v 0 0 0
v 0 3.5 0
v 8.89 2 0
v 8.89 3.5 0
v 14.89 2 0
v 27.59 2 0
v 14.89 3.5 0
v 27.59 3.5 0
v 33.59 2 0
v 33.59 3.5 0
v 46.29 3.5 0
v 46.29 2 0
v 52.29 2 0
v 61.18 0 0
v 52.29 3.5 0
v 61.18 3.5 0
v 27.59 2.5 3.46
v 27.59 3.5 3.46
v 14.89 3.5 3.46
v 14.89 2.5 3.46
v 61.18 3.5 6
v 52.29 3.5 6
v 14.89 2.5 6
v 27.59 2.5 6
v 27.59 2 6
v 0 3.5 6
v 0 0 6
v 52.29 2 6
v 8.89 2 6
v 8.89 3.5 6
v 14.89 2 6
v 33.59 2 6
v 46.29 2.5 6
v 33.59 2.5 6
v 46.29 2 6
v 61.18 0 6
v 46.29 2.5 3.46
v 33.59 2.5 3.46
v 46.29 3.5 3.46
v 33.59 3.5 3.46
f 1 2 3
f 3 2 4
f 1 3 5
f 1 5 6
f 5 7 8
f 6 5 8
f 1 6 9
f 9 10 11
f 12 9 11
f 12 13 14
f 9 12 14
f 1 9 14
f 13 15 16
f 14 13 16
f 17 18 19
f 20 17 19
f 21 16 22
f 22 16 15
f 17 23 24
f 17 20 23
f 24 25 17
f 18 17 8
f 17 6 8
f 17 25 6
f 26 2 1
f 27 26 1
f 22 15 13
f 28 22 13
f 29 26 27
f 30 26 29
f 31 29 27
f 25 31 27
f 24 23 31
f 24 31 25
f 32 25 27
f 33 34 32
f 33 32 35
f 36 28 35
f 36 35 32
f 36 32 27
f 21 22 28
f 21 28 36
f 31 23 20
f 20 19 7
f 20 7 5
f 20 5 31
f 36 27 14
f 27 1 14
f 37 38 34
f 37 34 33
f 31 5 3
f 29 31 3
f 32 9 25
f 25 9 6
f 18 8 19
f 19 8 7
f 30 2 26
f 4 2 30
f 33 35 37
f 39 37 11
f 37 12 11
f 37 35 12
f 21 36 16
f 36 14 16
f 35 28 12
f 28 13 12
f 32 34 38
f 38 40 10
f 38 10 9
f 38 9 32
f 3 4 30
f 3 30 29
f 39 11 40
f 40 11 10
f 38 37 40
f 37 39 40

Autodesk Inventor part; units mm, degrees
ref_plane "YZ Plane" through (0, 0, 0) normal (1, 0, 0) x (0, 1, 0)
ref_plane "XZ Plane" through (0, 0, 0) normal (0, 1, 0) x (-1, 0, 0)
ref_plane "XY Plane" through (0, 0, 0) normal (0, 0, 1) x (1, 0, 0)
sketch "Sketch1" plane through (0, 0, 0) normal (0, 0, 1) x (1, 0, 0)
  line L0 (0, 0) -> (61.18, 0)
  line L1 (61.18, 0) -> (61.18, 2)
  line L2 (61.18, 2) -> (0, 2)
  line L3 (0, 2) -> (0, 0)
  line L4 (14.89, 2) -> (27.59, 2)
  line L5 (27.59, 2) -> (27.59, 3.5)
  line L6 (27.59, 3.5) -> (14.89, 3.5)
  line L7 (14.89, 3.5) -> (14.89, 2)
  line L8 (33.59, 2) -> (46.29, 2)
  line L9 (46.29, 2) -> (46.29, 3.5)
  line L10 (46.29, 3.5) -> (33.59, 3.5)
  line L11 (33.59, 3.5) -> (33.59, 2)
  line L12 (8.89, 2) -> (0, 2)
  line L13 (0, 2) -> (0, 3.5)
  line L14 (0, 3.5) -> (8.89, 3.5)
  line L15 (8.89, 3.5) -> (8.89, 2)
  line L16 (52.29, 2) -> (61.18, 2)
  line L17 (61.18, 2) -> (61.18, 3.5)
  line L18 (61.18, 3.5) -> (52.29, 3.5)
  line L19 (52.29, 3.5) -> (52.29, 2)
  dimension "d0" = 6
  dimension "d1" = 2
  dimension "d2" = 1.5
  dimension "d3" = 6
  dimension "d4" = 6
  dimension "d5" = 12.7
  dimension "d6" = 8.89
  dimension "d7" = 8.89
extrude "Extrusion1" add sketch "Sketch1" along normal blind 6
sketch "Sketch2" plane through (14.89, 3.5, 0) normal (0, 1, 0) x (1, 0, 0)
  line L0 (31.4, 0) -> (18.7, 0) projected
  line L1 (18.7, 0) -> (18.7, -6) projected
  line L2 (31.4, -6) -> (18.7, -6) projected
  line L3 (31.4, 0) -> (31.4, -6) projected
  line L4 (12.7, 0) -> (0, 0) projected
  line L5 (0, 0) -> (0, -6) projected
  line L6 (12.7, -6) -> (0, -6) projected
  line L7 (12.7, 0) -> (12.7, -6) projected
  line L8 (-14.89, -6) -> (46.29, -6) projected
  line L9 (18.7, -6) -> (31.4, -6)
  line L10 (31.4, -6) -> (31.4, -3.46)
  line L11 (31.4, -3.46) -> (18.7, -3.46)
  line L12 (18.7, -3.46) -> (18.7, -6)
  line L13 (12.7, 0) -> (12.7, -6) projected
  line L14 (0, -6) -> (12.7, -6)
  line L15 (12.7, -6) -> (12.7, -3.46)
  line L16 (12.7, -3.46) -> (0, -3.46)
  line L17 (0, -3.46) -> (0, -6)
  point P0 (-14.89, 0)
  point P1 (0, -3.46)
  dimension "d14" = 2.54
extrude "Extrusion2" cut sketch "Sketch2" against normal blind 1 contours L6 L5 L16 L7 | L3 L2 L1 L11
properties part number "Button Support"
